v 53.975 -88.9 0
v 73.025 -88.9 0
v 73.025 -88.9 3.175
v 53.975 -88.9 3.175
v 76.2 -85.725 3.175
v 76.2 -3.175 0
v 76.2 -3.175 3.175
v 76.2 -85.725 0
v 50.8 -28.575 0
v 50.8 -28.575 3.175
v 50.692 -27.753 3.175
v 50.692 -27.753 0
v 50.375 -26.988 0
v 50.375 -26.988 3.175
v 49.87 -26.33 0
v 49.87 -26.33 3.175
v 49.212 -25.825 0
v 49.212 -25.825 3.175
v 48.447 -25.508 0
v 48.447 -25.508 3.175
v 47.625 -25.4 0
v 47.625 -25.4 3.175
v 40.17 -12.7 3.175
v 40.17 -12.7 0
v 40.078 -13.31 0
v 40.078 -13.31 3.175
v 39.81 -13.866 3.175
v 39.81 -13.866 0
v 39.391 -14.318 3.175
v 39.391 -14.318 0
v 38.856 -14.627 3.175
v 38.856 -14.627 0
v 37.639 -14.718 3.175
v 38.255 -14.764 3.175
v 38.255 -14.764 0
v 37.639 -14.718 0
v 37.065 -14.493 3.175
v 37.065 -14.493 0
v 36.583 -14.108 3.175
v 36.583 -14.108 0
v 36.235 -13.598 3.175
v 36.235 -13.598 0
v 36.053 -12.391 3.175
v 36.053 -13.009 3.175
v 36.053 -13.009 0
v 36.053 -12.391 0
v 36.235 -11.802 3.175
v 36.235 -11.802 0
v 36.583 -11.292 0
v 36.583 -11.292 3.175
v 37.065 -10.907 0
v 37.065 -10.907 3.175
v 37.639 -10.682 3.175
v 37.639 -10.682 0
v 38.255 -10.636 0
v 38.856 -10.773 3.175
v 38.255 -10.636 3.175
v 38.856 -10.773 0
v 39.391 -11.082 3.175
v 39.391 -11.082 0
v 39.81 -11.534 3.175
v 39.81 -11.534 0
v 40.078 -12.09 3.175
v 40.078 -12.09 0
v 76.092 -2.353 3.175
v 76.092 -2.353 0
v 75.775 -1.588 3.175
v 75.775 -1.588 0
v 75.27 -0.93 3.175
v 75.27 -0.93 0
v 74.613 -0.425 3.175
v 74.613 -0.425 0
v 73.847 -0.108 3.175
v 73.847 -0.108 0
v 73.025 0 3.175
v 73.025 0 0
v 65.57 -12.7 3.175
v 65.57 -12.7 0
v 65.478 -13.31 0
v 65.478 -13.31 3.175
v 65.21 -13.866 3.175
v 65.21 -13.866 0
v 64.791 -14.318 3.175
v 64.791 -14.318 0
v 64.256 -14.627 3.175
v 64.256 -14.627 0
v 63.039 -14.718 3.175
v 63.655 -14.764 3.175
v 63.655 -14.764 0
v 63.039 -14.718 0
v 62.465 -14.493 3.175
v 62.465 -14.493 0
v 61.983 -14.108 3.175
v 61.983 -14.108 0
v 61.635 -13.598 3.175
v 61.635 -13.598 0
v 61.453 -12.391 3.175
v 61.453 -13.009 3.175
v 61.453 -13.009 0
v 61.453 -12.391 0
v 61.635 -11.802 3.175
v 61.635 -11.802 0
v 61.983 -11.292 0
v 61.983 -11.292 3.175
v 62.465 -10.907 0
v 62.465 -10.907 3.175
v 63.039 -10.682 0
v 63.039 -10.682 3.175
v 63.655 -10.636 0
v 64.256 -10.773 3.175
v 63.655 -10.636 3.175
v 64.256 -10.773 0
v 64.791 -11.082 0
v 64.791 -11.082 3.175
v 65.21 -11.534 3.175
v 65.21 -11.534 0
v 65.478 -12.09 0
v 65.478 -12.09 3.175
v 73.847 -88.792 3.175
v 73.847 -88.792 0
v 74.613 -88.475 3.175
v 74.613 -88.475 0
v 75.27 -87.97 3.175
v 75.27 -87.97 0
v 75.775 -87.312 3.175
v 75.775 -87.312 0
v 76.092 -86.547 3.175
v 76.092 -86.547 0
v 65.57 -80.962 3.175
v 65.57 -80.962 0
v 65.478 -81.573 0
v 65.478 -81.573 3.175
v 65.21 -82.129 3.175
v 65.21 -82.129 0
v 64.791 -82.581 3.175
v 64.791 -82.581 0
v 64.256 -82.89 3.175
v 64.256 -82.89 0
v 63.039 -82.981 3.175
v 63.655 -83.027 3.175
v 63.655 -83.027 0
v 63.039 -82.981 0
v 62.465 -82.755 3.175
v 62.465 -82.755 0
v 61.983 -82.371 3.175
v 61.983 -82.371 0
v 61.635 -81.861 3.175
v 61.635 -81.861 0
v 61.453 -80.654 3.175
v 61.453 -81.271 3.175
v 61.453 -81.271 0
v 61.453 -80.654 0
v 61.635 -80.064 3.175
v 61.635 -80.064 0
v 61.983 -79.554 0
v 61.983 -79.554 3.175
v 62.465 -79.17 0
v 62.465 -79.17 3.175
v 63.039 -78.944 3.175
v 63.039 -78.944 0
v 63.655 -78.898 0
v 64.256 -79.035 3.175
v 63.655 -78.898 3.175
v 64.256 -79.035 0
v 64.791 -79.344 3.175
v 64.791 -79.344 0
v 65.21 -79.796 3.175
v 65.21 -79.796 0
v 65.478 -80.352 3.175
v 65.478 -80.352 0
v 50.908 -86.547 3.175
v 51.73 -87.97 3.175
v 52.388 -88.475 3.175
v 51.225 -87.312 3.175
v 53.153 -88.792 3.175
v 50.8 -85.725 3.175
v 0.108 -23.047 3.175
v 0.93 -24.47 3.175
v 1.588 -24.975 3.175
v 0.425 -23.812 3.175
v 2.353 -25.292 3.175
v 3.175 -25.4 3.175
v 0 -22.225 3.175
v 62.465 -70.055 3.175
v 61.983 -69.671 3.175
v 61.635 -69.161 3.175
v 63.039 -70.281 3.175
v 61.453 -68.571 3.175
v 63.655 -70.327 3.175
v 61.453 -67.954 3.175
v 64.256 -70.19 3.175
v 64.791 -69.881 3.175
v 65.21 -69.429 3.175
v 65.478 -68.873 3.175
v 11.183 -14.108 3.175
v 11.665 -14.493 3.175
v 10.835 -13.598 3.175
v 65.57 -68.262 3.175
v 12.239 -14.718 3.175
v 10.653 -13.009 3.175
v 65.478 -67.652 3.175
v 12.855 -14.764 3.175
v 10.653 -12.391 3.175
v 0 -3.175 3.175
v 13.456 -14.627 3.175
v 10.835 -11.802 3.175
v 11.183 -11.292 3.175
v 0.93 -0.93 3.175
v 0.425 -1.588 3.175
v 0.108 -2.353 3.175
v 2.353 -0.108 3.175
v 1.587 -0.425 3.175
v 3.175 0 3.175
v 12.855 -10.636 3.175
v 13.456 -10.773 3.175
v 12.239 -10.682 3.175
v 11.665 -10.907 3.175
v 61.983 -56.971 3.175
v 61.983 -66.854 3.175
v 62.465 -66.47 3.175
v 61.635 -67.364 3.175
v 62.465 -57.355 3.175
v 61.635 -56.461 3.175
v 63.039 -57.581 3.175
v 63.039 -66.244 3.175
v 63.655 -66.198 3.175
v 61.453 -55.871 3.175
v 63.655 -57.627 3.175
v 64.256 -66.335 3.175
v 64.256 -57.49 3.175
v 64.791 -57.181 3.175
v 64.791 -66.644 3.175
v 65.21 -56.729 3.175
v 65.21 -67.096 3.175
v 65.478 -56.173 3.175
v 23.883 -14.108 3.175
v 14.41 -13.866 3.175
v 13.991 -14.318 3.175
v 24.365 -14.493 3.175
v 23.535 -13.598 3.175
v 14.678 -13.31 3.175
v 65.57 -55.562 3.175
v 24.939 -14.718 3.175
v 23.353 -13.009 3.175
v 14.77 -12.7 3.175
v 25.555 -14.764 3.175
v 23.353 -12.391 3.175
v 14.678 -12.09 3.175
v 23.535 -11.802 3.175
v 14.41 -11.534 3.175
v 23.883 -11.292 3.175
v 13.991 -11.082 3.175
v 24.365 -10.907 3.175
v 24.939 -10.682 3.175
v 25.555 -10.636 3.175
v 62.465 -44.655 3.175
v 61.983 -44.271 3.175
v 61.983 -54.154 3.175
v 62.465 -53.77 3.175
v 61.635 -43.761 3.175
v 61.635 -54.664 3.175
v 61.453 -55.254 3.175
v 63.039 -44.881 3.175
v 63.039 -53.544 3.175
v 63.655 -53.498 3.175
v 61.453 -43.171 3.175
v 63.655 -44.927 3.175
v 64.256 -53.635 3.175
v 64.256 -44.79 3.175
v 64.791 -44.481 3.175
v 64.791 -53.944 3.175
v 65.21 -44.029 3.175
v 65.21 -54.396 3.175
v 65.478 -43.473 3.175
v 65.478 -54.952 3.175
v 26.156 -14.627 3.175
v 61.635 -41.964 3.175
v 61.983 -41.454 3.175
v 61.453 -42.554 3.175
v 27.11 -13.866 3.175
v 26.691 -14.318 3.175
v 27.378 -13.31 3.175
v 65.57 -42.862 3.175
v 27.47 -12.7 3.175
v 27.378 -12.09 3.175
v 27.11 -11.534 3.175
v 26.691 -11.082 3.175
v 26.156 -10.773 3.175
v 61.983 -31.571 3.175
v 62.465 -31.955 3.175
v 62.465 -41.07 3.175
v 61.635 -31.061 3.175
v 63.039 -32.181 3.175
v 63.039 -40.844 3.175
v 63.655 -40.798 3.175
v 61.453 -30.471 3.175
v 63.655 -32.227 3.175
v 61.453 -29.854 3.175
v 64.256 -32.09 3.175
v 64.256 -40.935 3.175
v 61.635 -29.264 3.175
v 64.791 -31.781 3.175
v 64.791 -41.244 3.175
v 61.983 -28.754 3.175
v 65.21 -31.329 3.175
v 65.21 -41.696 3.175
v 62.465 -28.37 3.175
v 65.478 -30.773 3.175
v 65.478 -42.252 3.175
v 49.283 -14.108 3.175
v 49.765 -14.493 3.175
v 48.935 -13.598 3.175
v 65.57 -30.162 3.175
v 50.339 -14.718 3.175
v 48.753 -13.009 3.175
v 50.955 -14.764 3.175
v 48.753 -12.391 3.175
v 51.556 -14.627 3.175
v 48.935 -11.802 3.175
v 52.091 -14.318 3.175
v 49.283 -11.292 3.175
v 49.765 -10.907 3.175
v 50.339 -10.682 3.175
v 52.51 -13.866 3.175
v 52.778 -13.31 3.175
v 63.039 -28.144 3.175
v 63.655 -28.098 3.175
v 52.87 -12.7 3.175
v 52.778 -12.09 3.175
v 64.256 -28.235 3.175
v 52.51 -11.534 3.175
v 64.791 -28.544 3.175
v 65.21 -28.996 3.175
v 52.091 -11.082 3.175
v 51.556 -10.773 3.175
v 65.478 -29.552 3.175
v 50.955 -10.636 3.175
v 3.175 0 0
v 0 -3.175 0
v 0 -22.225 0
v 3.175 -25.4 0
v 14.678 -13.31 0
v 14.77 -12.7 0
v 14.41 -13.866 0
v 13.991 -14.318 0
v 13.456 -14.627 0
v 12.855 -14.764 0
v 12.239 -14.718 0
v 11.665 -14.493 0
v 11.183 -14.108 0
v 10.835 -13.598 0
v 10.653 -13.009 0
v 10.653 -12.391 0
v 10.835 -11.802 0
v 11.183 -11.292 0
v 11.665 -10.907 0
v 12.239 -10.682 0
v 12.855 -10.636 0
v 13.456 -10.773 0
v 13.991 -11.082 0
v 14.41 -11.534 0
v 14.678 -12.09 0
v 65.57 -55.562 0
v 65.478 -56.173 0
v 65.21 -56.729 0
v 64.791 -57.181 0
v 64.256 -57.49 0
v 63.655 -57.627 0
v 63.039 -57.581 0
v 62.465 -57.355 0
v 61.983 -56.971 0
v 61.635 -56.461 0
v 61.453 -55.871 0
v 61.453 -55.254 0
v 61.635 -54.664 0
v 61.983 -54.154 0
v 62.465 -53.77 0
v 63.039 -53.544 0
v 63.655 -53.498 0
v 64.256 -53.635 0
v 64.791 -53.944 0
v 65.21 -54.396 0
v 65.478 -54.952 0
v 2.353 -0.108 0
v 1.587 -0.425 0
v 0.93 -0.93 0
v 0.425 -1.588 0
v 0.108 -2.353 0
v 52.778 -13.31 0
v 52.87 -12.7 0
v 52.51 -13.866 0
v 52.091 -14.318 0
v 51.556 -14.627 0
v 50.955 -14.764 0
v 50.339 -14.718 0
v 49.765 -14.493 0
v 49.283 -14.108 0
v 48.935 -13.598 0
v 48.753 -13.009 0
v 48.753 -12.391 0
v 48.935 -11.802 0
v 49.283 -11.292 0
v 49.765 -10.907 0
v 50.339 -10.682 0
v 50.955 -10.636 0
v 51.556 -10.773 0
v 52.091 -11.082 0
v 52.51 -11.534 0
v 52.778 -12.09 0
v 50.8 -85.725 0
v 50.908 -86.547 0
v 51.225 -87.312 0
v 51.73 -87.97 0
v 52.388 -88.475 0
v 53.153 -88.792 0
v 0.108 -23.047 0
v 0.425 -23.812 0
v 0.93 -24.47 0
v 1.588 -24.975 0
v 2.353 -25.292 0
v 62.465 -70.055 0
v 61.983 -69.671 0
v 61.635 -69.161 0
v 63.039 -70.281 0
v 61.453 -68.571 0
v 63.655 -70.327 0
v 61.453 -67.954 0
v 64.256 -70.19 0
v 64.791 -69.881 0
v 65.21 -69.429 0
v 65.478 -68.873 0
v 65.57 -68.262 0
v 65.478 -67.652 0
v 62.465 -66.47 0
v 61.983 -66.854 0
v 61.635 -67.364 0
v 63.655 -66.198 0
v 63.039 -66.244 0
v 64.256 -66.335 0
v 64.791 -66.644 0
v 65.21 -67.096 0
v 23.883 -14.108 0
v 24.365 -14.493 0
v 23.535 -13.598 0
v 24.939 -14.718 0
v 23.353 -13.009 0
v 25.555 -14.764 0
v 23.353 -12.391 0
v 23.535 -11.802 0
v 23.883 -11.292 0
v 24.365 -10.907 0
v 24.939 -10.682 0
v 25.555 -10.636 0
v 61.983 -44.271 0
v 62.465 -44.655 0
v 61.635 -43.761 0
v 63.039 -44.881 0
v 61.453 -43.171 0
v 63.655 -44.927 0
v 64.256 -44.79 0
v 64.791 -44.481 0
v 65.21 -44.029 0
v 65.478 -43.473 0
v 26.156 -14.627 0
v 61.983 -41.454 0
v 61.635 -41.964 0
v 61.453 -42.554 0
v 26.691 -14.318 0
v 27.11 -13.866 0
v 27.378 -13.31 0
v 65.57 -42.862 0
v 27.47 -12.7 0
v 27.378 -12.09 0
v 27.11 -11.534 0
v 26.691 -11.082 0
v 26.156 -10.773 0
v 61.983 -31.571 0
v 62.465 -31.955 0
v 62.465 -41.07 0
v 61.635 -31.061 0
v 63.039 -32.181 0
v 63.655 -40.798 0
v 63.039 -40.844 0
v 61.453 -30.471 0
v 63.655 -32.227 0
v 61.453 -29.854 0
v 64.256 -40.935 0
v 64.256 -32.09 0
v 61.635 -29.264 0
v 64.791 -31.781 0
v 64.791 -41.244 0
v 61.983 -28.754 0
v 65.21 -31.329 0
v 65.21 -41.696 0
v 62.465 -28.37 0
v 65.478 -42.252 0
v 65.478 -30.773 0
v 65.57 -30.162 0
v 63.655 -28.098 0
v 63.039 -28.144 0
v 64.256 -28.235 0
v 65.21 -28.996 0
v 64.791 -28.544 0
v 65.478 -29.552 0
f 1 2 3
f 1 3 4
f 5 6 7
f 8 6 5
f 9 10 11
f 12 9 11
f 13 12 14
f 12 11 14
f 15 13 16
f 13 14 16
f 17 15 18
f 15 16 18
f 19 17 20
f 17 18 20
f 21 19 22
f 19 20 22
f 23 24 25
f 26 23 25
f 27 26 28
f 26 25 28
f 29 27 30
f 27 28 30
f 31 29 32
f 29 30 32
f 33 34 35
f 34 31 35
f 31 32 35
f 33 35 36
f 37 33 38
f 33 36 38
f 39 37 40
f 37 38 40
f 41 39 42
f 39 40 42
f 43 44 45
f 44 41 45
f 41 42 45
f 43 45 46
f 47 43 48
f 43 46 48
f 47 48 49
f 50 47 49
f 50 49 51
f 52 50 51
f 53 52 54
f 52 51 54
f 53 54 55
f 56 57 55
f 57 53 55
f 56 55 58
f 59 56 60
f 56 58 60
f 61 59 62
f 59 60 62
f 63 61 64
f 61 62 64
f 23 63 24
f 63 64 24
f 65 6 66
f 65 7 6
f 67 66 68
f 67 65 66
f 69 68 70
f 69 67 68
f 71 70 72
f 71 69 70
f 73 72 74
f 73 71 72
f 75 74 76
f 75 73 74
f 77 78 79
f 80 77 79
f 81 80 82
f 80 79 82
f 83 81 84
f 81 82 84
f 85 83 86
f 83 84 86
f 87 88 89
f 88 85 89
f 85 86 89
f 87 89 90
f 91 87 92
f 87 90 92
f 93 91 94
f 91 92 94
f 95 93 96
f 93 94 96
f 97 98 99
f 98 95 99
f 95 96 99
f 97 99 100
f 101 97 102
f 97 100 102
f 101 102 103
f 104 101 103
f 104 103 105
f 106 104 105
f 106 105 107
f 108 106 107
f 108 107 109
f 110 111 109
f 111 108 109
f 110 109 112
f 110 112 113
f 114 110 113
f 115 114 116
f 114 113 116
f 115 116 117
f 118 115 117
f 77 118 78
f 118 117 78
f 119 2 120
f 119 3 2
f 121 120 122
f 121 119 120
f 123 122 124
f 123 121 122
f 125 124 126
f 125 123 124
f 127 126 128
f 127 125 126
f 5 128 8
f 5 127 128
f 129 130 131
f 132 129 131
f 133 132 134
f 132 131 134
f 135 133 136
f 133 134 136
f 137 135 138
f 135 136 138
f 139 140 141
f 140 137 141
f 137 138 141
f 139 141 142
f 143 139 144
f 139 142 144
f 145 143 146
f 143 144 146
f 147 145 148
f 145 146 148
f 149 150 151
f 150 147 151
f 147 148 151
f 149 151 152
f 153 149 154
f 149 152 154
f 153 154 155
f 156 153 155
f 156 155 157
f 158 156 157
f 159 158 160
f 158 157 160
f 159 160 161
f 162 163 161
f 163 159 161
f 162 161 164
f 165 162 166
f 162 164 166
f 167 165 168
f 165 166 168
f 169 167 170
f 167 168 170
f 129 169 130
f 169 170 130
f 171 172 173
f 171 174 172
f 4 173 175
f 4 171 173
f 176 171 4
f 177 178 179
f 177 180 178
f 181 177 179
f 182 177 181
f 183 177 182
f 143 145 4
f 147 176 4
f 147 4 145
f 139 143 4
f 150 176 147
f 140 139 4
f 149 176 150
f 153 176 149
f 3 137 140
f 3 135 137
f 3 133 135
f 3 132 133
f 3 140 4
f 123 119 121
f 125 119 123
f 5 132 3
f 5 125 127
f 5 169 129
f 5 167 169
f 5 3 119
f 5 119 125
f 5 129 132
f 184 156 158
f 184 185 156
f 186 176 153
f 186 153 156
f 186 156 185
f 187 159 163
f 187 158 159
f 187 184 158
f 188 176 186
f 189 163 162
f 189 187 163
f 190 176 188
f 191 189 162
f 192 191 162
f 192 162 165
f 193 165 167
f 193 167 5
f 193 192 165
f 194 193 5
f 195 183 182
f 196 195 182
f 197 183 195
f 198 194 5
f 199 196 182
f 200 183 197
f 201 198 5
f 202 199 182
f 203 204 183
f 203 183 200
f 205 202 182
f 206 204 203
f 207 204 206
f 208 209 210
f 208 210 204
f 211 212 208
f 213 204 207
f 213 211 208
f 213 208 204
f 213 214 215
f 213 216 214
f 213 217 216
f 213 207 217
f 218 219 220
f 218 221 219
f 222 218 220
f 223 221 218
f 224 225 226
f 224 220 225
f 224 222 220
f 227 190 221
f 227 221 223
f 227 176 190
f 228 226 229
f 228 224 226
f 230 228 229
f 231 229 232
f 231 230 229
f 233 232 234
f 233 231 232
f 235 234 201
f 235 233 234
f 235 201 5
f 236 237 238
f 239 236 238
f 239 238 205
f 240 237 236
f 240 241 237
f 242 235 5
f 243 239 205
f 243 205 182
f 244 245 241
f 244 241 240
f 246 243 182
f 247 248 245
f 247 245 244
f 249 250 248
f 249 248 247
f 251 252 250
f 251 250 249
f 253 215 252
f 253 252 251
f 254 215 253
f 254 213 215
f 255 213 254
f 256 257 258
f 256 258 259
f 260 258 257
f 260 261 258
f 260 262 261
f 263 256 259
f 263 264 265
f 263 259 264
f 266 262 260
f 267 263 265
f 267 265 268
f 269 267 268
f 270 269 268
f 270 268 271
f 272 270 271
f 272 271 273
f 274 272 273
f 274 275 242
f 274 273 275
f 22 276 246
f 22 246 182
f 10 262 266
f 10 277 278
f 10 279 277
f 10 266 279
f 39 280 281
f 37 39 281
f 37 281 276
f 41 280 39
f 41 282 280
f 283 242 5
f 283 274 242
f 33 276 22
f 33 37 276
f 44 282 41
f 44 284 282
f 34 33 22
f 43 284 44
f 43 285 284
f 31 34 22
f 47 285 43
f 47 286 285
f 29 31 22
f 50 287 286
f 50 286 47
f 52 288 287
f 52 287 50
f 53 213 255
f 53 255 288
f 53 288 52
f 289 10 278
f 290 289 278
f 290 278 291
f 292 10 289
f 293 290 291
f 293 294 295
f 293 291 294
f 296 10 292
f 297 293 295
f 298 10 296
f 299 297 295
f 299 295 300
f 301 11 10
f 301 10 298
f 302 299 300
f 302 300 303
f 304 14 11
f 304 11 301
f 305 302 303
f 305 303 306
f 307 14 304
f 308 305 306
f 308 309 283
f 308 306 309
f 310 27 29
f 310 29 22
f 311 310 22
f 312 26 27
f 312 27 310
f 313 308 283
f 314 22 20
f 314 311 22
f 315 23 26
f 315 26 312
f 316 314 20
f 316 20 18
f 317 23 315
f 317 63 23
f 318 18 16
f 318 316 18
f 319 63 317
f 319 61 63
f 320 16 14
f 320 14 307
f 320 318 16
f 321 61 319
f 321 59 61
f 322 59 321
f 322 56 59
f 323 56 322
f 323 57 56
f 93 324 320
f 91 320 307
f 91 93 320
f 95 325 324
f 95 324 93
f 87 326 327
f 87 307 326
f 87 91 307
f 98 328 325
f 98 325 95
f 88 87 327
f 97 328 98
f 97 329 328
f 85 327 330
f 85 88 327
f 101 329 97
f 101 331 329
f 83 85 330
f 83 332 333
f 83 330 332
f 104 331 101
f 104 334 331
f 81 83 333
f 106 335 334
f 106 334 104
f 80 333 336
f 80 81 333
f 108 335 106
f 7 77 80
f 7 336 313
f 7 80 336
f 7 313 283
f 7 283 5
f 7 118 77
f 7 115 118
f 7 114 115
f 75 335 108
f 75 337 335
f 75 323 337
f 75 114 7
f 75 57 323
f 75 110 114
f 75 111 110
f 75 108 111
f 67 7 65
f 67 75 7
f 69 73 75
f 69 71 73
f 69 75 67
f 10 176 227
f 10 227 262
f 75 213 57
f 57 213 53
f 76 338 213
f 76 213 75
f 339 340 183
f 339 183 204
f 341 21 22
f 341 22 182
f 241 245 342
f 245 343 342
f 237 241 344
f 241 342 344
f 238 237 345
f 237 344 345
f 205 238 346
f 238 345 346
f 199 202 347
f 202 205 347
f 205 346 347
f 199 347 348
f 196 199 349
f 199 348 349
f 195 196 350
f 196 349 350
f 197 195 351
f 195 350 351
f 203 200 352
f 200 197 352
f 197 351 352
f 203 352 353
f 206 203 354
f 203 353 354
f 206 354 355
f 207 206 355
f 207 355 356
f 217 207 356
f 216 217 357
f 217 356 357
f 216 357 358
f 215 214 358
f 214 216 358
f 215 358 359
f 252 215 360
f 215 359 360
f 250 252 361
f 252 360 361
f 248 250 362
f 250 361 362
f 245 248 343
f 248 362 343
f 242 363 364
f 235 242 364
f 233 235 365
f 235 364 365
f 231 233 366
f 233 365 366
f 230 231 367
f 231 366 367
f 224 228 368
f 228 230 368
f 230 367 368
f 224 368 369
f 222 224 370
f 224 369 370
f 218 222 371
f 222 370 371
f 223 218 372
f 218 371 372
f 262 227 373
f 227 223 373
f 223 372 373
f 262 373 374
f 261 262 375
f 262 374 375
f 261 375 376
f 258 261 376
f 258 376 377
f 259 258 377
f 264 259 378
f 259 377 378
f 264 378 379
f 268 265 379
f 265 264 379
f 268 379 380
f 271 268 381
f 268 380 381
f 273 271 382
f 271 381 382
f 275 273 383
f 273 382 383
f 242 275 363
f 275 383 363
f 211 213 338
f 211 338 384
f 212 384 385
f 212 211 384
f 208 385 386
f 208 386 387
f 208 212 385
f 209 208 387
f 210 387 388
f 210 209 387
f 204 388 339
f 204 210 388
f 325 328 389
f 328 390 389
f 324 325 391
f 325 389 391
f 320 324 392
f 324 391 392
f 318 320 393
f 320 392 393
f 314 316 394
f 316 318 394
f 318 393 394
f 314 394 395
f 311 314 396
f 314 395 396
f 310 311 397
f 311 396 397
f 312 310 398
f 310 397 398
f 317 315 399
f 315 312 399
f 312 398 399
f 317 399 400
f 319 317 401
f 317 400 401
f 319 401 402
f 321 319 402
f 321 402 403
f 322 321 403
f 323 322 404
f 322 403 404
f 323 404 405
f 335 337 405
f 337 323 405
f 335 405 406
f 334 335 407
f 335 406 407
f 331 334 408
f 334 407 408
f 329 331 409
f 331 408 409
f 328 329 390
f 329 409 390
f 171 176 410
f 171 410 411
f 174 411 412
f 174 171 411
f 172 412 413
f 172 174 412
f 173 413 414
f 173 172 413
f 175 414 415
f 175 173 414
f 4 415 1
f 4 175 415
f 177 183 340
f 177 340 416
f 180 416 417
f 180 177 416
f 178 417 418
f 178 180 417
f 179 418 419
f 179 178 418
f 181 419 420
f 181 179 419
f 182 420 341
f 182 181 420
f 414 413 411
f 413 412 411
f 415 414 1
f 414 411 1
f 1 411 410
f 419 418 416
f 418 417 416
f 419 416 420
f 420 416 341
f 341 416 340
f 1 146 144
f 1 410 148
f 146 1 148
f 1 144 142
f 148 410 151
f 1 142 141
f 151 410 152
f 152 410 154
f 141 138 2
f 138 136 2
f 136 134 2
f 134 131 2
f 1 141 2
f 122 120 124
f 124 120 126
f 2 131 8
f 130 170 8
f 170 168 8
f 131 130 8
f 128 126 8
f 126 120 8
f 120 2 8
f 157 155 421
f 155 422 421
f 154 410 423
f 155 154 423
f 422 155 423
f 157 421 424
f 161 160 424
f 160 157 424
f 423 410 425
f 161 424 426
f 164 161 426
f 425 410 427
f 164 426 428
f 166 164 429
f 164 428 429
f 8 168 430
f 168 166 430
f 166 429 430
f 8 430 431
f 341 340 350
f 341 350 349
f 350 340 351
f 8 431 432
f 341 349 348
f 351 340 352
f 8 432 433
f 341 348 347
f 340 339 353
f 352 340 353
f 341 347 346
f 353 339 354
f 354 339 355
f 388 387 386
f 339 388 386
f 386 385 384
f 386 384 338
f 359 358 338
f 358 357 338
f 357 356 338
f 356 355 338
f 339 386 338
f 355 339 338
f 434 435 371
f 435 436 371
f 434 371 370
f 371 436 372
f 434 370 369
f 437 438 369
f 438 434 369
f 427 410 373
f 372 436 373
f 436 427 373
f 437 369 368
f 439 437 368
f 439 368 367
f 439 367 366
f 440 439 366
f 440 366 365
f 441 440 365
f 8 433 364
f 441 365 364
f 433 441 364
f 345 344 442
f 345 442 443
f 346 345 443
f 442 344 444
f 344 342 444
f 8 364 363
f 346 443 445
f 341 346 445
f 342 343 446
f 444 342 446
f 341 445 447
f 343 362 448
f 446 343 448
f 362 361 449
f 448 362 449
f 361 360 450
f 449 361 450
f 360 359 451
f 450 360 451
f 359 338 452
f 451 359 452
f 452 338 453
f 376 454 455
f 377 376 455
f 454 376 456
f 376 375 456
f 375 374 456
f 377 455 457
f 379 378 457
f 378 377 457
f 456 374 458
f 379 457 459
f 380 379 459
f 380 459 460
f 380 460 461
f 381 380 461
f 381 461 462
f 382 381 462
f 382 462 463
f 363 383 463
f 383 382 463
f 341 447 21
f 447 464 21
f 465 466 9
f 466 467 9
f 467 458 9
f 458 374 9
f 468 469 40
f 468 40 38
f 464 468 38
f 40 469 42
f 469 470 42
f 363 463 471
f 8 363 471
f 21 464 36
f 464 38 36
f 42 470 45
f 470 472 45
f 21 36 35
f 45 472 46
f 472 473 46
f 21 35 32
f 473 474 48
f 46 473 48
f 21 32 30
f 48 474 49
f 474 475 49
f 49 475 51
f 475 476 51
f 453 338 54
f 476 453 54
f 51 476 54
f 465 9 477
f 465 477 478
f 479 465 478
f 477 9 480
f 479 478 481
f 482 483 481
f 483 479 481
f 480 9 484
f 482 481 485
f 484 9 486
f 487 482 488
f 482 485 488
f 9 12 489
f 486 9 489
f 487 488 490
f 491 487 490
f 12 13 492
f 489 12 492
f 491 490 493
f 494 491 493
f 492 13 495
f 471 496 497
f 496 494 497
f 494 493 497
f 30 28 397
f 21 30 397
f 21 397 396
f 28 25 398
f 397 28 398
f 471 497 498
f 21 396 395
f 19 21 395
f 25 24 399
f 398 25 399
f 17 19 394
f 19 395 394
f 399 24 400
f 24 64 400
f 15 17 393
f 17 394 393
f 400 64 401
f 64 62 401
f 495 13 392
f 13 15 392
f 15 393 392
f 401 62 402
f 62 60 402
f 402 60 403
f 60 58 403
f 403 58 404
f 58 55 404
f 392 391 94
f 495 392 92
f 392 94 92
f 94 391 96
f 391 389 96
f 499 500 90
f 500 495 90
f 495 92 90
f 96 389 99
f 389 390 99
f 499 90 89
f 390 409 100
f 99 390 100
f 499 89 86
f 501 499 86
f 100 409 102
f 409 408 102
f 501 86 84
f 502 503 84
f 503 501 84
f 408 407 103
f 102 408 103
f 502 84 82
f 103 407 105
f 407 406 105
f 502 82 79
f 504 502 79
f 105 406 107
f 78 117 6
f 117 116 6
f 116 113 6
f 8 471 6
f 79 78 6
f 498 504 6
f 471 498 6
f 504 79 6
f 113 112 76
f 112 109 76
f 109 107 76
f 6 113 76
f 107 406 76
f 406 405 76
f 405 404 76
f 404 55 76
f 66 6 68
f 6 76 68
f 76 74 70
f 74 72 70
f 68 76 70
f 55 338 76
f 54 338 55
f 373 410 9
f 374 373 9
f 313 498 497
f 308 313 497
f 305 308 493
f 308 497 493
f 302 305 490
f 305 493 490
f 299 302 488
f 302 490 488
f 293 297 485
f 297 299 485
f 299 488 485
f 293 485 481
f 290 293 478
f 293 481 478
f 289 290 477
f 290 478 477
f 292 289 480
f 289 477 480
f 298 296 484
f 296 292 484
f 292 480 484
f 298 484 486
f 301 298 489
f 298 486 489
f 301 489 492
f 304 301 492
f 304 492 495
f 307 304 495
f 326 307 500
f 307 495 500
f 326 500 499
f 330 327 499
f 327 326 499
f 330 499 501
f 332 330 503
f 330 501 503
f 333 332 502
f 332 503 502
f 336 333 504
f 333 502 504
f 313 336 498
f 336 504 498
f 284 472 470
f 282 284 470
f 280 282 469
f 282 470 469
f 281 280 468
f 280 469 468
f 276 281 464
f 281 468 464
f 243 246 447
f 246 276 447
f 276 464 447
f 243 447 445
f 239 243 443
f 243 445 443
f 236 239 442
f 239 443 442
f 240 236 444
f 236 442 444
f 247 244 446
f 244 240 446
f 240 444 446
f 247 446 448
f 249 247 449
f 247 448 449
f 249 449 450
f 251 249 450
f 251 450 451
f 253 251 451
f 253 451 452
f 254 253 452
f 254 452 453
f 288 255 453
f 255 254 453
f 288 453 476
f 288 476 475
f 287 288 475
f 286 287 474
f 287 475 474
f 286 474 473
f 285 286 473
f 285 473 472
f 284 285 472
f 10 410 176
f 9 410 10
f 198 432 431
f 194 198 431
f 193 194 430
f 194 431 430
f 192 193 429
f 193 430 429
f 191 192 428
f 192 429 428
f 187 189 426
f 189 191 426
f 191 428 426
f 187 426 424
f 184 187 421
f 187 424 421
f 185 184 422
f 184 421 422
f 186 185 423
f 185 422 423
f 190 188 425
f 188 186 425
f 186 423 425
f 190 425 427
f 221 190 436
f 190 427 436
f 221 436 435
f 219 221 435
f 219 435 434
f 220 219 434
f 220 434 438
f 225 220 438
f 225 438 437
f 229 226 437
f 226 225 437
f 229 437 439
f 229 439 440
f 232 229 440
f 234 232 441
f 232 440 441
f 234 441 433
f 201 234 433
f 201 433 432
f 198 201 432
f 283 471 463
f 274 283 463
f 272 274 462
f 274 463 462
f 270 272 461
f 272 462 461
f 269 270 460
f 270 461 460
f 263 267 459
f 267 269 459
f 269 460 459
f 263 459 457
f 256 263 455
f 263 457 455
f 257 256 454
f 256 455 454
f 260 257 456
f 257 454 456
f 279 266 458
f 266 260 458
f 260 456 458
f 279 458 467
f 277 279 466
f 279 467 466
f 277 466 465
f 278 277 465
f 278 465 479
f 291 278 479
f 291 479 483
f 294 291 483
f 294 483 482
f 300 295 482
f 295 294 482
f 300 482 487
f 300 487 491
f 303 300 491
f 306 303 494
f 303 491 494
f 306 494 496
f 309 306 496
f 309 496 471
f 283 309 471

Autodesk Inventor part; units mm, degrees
ref_plane "YZ Plane" through (0, 0, 0) normal (1, 0, 0) x (0, 1, 0)
ref_plane "XZ Plane" through (0, 0, 0) normal (0, 1, 0) x (-1, 0, 0)
ref_plane "XY Plane" through (0, 0, 0) normal (0, 0, 1) x (1, 0, 0)
sketch "Sketch1" plane through (0, 0, 0) normal (0, 0, 1) x (1, 0, 0)
  line L0 (0, 0) -> (76.2, 0)
  line L1 (76.2, 0) -> (76.2, -88.9)
  line L2 (76.2, -88.9) -> (50.8, -88.9)
  line L3 (50.8, -88.9) -> (50.8, -25.4)
  line L4 (50.8, -25.4) -> (0, -25.4)
  line L5 (0, -25.4) -> (0, 0)
  circle A0 centre (12.7, -12.7) radius 2.0701
  circle A1 centre (63.5, -30.1625) radius 2.0701
  circle A2 centre (63.5, -42.8625) radius 2.0701
  circle A3 centre (63.5, -55.5625) radius 2.0701
  circle A4 centre (63.5, -68.2625) radius 2.0701
  circle A5 centre (63.5, -80.9625) radius 2.0701
  circle A6 centre (25.4, -12.7) radius 2.0701
  circle A7 centre (38.1, -12.7) radius 2.0701
  circle A8 centre (50.8, -12.7) radius 2.0701
  circle A9 centre (63.5, -12.7) radius 2.0701
  dimension "d0" = 76.2
  dimension "d3" = 25.4
  dimension "d4" = 88.9
  dimension "d5" = 4.1402
  dimension "d6" = 12.7
  dimension "d7" = 12.7
  dimension "d18" = 12.7
  dimension "d23" = 12.7
  dimension "d27" = 4.7625
  dimension "d28" = 25.4
  dimension "d31" = 12.7
extrude "Extrusion1" add sketch "Sketch1" along normal blind 3.175
fillet "Fillet1" radius 3.175 6 edges at (0, 0, 1.5875) (0, -25.4, 1.5875) (50.8, -25.4, 1.5875) (50.8, -88.9, 1.5875) (76.2, -88.9, 1.5875) (76.2, 0, 1.5875)
properties part number "Roller Crossbar Gusset (Custom)" material "Aluminum 6061"
